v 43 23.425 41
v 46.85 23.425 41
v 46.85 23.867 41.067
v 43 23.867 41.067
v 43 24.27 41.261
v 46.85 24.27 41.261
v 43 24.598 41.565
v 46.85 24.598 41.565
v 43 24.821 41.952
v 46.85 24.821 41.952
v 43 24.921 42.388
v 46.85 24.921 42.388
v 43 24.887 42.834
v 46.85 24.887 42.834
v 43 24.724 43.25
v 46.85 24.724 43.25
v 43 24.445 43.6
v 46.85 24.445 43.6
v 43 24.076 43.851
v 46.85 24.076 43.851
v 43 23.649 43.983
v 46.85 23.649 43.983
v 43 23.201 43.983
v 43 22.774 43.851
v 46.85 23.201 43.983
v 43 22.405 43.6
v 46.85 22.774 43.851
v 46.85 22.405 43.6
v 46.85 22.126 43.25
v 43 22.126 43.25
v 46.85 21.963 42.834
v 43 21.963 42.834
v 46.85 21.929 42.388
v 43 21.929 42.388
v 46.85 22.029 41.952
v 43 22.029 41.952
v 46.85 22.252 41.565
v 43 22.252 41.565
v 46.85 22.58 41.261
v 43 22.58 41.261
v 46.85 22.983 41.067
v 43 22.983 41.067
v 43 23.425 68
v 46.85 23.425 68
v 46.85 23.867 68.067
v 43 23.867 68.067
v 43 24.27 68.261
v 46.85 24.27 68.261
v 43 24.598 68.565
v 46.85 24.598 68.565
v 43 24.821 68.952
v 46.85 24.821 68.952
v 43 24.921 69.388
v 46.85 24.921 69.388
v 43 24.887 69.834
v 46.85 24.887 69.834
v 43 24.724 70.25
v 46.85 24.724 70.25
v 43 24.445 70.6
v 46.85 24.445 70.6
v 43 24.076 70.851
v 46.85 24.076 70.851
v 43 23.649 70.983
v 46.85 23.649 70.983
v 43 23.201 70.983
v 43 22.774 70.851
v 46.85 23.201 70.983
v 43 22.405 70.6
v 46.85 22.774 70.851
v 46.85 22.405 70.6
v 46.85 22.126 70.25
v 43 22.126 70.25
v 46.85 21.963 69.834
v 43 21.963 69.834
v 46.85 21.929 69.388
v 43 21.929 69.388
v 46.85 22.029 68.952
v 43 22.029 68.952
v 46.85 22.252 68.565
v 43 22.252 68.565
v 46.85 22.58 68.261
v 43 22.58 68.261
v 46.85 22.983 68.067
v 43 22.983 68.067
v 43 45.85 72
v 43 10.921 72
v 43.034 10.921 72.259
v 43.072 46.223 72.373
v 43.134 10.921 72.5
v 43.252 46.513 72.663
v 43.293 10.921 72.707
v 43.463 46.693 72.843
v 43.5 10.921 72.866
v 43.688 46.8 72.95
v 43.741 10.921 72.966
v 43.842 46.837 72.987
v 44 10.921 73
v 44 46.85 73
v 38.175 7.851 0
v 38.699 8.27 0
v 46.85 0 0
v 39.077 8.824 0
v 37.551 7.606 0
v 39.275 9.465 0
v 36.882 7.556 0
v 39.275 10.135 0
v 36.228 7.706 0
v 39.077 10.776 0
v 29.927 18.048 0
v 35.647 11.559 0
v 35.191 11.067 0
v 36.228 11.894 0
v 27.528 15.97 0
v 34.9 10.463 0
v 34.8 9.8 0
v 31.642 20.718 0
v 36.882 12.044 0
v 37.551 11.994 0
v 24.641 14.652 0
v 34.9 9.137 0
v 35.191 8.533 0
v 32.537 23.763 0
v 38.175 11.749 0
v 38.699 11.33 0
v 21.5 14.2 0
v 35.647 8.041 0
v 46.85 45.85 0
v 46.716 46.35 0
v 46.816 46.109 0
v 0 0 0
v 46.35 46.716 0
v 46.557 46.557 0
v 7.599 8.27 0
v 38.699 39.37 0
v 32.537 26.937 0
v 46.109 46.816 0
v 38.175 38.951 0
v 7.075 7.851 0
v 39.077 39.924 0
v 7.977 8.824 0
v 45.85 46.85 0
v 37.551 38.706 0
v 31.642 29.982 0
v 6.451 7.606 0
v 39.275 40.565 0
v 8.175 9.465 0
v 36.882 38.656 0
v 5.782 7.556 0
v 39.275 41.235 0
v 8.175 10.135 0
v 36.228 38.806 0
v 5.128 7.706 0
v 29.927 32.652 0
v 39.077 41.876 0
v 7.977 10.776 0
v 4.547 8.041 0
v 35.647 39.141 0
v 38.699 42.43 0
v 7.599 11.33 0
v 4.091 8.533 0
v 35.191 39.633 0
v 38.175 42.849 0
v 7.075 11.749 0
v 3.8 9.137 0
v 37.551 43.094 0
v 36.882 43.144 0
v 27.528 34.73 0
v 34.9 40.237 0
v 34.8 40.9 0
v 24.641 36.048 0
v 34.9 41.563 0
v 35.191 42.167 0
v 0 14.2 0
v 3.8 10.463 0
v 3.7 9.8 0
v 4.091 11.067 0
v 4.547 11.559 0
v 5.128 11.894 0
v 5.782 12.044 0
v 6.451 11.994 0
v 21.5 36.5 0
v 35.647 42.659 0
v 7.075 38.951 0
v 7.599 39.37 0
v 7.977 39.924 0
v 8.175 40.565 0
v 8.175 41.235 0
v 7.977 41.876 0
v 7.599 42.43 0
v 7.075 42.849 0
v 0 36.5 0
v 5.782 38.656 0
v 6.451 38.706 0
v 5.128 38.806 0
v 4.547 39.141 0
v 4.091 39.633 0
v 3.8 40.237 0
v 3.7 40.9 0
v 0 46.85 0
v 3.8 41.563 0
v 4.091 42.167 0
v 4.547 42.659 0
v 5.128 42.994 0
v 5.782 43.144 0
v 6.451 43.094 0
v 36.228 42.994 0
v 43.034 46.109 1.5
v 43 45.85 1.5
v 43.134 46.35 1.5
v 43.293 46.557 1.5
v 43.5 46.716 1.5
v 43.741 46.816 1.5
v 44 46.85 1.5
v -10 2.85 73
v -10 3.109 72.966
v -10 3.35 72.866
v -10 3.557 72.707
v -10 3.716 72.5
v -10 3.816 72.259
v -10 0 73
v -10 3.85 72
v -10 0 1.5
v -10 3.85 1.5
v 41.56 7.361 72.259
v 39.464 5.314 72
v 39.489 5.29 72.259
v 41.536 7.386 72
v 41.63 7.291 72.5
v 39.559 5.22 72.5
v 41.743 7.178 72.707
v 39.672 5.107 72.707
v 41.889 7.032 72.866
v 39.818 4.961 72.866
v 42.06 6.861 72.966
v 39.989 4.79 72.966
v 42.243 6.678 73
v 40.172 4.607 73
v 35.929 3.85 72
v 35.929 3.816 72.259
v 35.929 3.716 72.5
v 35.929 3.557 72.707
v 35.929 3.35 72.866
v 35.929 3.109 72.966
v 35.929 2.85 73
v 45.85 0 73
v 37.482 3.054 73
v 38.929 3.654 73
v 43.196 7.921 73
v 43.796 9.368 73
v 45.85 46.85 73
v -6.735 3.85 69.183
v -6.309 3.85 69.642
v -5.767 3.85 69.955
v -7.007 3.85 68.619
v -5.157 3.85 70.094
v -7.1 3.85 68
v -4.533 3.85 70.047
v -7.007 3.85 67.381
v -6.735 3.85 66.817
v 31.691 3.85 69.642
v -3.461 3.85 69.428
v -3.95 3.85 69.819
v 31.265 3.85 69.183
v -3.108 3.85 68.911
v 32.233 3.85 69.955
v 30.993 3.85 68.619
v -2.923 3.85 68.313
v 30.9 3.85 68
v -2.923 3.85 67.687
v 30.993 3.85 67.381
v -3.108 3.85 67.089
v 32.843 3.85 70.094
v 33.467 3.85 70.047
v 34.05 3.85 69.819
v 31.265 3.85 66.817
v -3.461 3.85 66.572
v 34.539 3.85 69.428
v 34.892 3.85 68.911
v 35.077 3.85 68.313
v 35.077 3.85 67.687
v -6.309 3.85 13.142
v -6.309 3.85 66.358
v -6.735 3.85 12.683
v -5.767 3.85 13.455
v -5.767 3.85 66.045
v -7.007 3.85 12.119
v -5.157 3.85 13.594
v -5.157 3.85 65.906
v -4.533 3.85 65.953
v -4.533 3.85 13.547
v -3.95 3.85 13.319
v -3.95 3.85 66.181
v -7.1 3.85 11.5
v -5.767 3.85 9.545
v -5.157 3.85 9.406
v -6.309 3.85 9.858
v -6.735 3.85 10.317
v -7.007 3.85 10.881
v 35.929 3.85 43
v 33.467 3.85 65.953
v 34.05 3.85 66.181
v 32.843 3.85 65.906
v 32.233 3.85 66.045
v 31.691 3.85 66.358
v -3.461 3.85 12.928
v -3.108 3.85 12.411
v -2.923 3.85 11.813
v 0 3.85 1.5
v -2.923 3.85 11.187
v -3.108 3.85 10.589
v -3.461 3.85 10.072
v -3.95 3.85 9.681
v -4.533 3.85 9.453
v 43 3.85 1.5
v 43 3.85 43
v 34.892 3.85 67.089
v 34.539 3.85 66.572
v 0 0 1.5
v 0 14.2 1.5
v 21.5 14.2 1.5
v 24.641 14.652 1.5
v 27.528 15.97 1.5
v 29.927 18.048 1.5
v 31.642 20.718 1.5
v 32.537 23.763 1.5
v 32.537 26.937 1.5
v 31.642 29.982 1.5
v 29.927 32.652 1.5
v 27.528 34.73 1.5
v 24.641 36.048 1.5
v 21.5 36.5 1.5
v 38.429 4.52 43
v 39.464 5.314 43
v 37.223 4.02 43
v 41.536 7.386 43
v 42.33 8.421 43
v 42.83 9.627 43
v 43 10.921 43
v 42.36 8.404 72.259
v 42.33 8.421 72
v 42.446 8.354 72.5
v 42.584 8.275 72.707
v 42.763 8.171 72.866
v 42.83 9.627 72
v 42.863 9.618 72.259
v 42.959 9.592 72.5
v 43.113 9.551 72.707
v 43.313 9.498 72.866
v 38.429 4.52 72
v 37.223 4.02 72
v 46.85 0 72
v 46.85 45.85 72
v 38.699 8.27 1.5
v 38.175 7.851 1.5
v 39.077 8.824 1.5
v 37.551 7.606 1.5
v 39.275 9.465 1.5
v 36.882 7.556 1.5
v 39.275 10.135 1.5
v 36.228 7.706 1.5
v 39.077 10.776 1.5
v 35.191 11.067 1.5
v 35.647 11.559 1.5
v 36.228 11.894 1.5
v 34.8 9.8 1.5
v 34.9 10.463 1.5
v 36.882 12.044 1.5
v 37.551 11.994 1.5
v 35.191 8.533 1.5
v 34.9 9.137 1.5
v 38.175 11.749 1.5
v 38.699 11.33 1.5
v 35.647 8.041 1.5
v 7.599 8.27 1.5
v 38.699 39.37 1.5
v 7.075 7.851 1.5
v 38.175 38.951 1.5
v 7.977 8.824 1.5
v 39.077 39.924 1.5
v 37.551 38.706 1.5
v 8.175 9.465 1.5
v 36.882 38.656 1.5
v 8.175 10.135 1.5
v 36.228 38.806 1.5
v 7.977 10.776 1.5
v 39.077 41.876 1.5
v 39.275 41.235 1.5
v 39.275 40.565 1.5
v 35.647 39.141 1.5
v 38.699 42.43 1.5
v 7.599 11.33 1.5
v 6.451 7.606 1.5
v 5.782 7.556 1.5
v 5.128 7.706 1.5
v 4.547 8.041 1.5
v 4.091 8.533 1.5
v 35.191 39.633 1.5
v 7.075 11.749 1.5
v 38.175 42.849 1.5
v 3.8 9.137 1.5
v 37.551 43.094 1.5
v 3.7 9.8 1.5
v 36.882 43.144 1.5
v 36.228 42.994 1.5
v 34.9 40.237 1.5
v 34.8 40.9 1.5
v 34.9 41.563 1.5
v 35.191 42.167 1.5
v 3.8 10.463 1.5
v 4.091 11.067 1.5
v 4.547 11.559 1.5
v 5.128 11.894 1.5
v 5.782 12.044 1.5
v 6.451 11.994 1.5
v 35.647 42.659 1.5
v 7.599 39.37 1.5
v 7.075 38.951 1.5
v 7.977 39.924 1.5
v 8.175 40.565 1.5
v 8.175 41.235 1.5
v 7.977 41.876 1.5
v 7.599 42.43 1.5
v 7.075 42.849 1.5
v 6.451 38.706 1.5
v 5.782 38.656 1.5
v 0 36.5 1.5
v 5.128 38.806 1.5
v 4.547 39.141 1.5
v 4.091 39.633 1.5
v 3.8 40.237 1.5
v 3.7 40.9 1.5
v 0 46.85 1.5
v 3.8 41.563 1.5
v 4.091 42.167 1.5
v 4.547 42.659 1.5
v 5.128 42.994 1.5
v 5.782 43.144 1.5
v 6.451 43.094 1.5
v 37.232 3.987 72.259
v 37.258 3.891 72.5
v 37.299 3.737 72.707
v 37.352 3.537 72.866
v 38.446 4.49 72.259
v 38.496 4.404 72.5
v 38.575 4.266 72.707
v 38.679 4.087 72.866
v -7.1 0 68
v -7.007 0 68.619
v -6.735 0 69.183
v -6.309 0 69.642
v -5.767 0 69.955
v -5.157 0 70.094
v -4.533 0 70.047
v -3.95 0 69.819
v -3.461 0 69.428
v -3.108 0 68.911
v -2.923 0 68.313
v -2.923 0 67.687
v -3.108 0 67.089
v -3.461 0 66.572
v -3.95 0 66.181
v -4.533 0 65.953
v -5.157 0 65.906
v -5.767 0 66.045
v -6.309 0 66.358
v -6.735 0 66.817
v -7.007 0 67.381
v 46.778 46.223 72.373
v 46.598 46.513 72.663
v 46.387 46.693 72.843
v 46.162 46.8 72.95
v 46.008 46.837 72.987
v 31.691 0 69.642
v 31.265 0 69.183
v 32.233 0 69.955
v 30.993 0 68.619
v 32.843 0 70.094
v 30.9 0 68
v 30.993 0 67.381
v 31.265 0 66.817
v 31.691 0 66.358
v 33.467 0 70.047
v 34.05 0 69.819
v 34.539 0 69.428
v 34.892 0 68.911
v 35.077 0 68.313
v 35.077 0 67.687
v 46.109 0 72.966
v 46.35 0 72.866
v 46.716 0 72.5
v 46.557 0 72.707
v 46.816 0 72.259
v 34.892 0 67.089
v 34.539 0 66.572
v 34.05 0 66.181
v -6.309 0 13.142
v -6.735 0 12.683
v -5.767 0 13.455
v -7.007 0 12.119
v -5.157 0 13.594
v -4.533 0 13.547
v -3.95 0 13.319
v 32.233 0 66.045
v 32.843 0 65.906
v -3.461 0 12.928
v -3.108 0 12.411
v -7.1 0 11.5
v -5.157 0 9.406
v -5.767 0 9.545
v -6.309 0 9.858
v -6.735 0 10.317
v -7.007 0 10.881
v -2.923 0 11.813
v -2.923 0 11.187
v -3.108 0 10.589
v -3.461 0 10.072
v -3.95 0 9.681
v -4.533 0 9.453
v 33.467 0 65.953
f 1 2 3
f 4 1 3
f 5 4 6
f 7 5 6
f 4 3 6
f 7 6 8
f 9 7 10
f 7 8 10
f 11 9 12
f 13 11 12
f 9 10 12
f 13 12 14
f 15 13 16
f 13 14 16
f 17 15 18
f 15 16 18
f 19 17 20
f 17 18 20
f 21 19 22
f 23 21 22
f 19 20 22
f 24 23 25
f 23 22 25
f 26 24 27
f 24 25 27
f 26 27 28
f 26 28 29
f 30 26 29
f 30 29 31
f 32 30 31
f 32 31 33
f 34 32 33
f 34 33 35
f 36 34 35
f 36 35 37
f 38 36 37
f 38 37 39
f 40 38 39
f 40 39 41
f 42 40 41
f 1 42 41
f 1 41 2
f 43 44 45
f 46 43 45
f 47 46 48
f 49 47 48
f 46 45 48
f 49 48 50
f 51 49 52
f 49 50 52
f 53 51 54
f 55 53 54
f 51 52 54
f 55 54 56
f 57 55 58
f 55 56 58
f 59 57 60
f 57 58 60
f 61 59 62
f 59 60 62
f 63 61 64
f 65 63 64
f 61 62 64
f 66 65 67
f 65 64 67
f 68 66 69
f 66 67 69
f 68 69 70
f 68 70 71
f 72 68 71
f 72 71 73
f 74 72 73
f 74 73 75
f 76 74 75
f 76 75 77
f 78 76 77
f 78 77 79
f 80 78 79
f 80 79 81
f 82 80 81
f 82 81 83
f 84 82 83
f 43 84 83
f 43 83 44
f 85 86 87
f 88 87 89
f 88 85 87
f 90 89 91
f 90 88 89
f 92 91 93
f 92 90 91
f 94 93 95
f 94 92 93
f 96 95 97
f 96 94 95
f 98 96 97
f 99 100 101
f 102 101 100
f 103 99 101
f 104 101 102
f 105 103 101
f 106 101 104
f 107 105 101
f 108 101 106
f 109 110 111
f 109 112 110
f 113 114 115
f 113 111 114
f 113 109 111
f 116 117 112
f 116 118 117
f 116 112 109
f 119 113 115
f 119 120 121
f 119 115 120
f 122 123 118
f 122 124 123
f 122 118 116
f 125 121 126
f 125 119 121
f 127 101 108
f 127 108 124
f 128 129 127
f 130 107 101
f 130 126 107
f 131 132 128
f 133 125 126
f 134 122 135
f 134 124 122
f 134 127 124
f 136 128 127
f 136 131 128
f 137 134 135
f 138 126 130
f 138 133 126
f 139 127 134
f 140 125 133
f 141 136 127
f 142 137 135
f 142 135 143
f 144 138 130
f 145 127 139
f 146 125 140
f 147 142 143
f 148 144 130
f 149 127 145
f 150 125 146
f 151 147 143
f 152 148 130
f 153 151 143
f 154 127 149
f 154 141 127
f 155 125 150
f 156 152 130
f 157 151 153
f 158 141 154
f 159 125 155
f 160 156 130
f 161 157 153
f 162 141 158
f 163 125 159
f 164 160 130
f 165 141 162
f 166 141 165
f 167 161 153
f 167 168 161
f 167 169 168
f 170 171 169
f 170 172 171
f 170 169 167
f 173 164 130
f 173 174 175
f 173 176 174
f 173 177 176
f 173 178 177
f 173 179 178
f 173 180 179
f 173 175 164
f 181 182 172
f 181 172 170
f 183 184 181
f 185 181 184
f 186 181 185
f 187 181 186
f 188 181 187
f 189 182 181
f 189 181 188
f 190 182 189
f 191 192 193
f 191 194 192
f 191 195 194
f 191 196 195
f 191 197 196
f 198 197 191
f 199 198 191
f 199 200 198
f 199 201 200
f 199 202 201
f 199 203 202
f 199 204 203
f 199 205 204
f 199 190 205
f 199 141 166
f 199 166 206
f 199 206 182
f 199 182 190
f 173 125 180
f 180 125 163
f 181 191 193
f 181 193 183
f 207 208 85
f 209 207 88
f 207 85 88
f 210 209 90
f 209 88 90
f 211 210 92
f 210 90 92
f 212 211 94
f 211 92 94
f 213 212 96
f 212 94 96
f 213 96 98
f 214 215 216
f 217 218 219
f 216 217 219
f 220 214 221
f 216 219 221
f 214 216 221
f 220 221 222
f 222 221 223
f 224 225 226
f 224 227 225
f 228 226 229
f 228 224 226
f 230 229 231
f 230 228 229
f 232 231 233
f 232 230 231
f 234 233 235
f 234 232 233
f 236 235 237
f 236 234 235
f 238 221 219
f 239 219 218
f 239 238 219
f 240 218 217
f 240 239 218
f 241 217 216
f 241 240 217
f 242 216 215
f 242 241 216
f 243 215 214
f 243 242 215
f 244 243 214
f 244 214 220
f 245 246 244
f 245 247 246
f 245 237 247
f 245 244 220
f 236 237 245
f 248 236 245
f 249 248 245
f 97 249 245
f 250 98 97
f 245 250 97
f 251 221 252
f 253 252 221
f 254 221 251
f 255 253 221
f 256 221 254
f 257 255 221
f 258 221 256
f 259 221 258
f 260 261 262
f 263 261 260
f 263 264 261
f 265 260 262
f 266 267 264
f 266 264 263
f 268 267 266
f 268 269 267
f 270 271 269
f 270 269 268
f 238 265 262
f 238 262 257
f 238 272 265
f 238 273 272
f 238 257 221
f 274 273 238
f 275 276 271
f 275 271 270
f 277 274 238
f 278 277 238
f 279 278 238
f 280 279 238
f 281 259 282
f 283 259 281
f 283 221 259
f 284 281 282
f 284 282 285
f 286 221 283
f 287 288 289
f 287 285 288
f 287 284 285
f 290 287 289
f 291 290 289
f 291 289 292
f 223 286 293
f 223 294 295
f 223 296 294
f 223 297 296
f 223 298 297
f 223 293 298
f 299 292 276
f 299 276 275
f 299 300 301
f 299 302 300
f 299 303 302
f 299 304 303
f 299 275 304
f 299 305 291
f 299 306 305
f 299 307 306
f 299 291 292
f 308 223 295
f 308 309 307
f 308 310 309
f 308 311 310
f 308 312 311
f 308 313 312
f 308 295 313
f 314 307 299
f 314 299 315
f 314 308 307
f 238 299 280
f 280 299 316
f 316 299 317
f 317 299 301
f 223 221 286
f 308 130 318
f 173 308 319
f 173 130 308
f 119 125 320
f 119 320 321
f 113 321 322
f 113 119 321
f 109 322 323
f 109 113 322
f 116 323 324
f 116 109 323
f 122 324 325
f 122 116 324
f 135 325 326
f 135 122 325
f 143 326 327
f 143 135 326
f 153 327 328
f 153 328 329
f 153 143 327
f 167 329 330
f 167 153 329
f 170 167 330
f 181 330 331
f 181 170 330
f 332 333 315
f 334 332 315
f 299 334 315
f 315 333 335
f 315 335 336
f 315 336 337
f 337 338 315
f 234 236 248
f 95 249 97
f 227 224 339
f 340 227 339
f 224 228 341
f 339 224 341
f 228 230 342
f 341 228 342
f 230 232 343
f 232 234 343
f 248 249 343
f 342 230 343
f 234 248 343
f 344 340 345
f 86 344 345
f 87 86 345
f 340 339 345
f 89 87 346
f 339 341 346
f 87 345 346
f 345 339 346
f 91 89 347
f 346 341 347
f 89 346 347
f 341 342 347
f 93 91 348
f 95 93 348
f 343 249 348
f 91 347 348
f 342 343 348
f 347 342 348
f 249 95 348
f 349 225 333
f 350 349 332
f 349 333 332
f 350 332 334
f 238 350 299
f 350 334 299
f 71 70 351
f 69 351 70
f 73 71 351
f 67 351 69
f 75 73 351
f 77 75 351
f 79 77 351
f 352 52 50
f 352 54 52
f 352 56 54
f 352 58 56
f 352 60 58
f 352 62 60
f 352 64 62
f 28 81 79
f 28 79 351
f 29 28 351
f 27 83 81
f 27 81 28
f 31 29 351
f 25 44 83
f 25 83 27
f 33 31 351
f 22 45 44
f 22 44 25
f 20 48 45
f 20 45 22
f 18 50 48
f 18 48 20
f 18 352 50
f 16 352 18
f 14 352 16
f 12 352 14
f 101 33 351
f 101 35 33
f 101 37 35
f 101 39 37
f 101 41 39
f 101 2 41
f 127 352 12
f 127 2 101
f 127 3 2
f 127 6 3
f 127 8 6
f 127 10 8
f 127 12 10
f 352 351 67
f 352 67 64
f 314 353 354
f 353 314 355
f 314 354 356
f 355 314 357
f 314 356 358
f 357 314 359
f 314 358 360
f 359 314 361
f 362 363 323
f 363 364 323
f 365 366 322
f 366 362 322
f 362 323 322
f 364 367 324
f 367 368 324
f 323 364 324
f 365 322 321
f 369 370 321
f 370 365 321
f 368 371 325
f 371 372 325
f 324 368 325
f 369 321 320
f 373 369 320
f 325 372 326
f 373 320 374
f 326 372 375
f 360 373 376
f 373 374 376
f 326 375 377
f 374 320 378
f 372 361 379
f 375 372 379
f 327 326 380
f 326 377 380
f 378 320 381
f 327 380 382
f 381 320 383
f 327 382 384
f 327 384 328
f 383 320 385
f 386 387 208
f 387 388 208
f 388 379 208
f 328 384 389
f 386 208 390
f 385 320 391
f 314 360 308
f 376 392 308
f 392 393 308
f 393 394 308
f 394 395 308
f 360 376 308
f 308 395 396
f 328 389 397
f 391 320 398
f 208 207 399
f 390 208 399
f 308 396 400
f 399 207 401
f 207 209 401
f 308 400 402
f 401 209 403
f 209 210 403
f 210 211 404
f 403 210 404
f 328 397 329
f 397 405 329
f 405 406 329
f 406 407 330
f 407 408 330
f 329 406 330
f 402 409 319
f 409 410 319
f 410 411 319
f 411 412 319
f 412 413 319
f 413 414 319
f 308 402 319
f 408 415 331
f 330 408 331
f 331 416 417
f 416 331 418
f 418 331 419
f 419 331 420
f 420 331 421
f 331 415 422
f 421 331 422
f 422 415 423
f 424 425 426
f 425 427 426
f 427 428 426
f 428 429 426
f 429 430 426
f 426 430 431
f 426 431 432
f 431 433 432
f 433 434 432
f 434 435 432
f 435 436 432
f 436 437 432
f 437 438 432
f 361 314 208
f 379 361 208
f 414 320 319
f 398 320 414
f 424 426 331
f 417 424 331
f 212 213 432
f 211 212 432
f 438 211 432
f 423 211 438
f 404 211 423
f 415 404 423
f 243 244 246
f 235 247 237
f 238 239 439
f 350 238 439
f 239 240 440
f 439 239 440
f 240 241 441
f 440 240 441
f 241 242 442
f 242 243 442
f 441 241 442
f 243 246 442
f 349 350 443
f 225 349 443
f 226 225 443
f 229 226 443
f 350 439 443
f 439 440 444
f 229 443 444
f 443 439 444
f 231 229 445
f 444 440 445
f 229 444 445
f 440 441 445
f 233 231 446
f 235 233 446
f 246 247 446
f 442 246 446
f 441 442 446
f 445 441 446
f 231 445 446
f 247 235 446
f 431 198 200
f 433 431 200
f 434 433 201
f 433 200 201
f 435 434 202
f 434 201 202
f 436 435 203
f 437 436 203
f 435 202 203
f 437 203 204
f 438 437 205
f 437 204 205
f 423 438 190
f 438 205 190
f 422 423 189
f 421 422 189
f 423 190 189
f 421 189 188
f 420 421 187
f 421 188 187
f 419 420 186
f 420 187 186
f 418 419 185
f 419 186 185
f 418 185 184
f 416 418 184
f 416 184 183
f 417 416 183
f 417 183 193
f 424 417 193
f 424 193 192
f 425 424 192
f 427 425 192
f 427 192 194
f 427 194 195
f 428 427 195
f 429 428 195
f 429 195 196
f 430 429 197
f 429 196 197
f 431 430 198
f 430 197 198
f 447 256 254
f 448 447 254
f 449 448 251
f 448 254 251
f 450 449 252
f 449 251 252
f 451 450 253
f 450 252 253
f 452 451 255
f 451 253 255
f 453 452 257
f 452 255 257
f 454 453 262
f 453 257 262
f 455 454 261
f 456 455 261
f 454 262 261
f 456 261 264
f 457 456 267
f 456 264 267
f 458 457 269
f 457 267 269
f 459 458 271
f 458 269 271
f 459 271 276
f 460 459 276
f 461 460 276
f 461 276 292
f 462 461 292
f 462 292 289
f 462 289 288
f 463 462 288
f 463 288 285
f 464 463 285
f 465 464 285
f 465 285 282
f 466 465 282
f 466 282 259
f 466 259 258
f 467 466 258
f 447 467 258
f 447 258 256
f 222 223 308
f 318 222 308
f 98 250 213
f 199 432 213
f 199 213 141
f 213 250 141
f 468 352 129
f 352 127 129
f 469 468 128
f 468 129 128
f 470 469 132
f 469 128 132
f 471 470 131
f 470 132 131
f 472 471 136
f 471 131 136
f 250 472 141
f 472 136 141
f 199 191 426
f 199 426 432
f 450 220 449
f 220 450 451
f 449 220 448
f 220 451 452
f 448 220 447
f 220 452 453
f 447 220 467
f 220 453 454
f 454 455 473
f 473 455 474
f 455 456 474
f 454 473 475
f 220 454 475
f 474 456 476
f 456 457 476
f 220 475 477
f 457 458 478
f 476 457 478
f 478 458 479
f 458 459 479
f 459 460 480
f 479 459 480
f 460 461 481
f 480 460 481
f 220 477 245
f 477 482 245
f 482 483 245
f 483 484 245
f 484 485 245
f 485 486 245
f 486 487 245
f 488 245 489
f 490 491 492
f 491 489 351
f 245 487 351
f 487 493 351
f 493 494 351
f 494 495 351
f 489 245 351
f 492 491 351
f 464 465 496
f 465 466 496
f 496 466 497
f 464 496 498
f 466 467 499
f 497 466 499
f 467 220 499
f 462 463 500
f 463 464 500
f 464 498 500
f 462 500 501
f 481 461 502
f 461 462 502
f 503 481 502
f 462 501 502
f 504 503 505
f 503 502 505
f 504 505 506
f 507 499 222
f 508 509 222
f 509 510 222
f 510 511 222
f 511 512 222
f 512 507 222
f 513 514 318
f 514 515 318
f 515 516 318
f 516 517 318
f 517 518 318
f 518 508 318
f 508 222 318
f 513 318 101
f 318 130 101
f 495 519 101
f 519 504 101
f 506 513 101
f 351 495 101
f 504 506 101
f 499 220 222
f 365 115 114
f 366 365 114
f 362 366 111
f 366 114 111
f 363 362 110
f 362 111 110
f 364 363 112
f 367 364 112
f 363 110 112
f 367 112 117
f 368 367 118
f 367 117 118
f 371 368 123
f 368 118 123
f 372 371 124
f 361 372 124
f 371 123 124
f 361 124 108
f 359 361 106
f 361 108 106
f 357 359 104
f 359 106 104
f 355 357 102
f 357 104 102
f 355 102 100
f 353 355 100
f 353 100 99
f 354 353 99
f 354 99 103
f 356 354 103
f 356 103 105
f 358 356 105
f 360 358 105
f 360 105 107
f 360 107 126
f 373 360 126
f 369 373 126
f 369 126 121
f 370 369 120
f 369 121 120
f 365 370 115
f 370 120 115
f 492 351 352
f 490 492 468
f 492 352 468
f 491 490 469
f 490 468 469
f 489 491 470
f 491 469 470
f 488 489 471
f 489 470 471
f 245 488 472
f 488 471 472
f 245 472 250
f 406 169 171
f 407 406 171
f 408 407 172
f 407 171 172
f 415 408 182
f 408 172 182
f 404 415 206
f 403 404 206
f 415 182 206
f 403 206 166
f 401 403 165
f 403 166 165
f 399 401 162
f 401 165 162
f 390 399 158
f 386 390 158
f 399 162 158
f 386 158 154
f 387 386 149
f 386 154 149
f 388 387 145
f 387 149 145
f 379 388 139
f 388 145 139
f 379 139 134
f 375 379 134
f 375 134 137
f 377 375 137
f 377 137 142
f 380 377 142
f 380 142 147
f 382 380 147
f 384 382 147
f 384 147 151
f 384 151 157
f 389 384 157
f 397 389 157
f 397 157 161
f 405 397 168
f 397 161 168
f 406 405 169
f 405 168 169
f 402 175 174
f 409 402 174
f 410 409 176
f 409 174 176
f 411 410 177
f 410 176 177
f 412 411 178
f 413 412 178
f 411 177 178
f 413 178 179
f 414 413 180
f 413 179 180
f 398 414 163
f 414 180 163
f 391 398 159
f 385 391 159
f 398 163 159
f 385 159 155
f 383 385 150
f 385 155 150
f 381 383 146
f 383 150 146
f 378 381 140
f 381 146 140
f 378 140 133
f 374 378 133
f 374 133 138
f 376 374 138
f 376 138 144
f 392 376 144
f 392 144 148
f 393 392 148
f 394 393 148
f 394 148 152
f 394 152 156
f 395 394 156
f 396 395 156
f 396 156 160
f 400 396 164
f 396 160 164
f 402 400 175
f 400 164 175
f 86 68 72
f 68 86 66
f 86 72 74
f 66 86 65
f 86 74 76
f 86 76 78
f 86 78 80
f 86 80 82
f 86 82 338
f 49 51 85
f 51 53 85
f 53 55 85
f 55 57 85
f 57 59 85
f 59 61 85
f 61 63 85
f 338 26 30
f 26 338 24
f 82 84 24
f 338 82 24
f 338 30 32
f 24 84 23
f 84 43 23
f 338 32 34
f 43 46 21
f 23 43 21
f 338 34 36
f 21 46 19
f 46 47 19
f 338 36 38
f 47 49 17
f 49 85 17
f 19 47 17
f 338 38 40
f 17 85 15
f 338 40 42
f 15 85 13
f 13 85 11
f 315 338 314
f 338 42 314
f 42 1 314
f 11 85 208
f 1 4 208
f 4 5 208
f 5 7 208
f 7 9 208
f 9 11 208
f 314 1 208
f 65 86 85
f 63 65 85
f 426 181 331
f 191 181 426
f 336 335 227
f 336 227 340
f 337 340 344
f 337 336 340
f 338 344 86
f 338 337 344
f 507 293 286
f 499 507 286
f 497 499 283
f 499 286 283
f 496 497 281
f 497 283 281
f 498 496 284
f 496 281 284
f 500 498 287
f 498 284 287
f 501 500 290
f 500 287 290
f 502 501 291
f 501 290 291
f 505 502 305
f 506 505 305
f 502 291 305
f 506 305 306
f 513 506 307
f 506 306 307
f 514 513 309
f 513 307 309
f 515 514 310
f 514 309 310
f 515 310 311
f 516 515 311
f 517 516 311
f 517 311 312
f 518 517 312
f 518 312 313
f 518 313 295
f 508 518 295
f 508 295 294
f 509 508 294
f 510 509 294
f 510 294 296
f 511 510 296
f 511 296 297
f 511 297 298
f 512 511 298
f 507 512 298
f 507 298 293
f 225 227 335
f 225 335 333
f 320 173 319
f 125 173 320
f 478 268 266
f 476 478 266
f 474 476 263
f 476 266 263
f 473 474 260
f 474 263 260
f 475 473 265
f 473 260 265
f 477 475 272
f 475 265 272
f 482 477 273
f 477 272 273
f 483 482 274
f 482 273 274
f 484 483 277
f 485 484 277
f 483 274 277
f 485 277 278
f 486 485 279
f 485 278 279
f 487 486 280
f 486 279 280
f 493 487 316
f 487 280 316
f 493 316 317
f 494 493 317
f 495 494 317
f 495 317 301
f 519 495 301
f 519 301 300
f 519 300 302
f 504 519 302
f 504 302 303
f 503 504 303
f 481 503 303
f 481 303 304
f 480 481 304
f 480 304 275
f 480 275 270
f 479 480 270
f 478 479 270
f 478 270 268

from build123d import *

# Parameters (mm, degrees)
BOSS_EXTRU_1_DEPTH      = 39
ESQUISSE2_R             = 2.25
BOSS_EXTRU_2_DEPTH      = 1.5
ESQUISSE3_W             = 34
ESQUISSE3_H             = 46.85
BOSS_EXTRU_3_DEPTH      = 3.85
ESQUISSE4_R             = 1.5
ENL_V_MAT_EXTRU_1_DEPTH = 6.5
ESQUISSE5_W             = 53
ESQUISSE5_H             = 71.5
BOSS_EXTRU_4_DEPTH      = 3.85
ESQUISSE6_R             = 2.1
ENL_V_MAT_EXTRU_2_DEPTH = 6.5
BOSS_EXTRU_5_DEPTH      = 30
CONG_1_R                = 5
CONG_2_R                = 1


with BuildPart() as part:
    # Esquisse1 → Boss.-Extru.1 (new body)
    with BuildSketch(Plane.XY):
        Polygon((0, 0), (46.85, 0), (46.85, 46.85), (43, 46.85), (43, 3.85), (0, 3.85), align=None)
    extrude(amount=BOSS_EXTRU_1_DEPTH)

    # Esquisse2 → Boss.-Extru.2 (add)
    with BuildSketch(Plane(origin=(0, 0, 0), x_dir=(-1, 0, 0), z_dir=(0, 0, -1))):
        with BuildLine():
            Line((0, 46.85), (-43, 46.85))
            Line((-43, 46.85), (-43, 3.85))
            Line((-43, 3.85), (0, 3.85))
            Line((0, 3.85), (0, 14.2))
            Line((0, 14.2), (-21.5, 14.2))
            ThreePointArc((-21.5, 14.2), (-32.65, 25.35), (-21.5, 36.5))
            Line((-21.5, 36.5), (0, 36.5))
            Line((0, 36.5), (0, 46.85))
        make_face()
        with Locations((-37.05, 9.8)):
            Circle(ESQUISSE2_R, mode=Mode.SUBTRACT)
        with Locations((-5.95, 9.8)):
            Circle(ESQUISSE2_R, mode=Mode.SUBTRACT)
        with Locations((-37.05, 40.9)):
            Circle(ESQUISSE2_R, mode=Mode.SUBTRACT)
        with Locations((-5.95, 40.9)):
            Circle(ESQUISSE2_R, mode=Mode.SUBTRACT)
    extrude(amount=-BOSS_EXTRU_2_DEPTH)

    # Esquisse3 → Boss.-Extru.3 (add)
    with BuildSketch(Plane(origin=(46.85, 0, 0), x_dir=(0, 0, -1), z_dir=(1, 0, 0))):
        with Locations((-56, 23.425)):
            Rectangle(ESQUISSE3_W, ESQUISSE3_H)
    extrude(amount=-BOSS_EXTRU_3_DEPTH)

    # Esquisse4 → Enlèv. mat.-Extru.1 (cut)
    with BuildSketch(Plane(origin=(46.85, 0, 0), x_dir=(0, 0, -1), z_dir=(1, 0, 0))):
        with Locations((-69.5, 23.425)):
            Circle(ESQUISSE4_R)
        with Locations((-42.5, 23.425)):
            Circle(ESQUISSE4_R)
    extrude(amount=-ENL_V_MAT_EXTRU_1_DEPTH, mode=Mode.SUBTRACT)

    # Esquisse5 → Boss.-Extru.4 (add)
    with BuildSketch(Plane(origin=(0, 3.85, 0), x_dir=(1, 0, 0), z_dir=(0, 1, 0))):
        with Locations((16.5, -37.25)):
            Rectangle(ESQUISSE5_W, ESQUISSE5_H)
    extrude(amount=-BOSS_EXTRU_4_DEPTH)

    # Esquisse6 → Enlèv. mat.-Extru.2 (cut)
    with BuildSketch(Plane(origin=(0, 3.85, 0), x_dir=(1, 0, 0), z_dir=(0, 1, 0))):
        with Locations(Location((-5, -68, 0), (0, 0, 180))):
            Circle(ESQUISSE6_R)
        with Locations(Location((33, -68, 0), (0, 0, 180))):
            Circle(ESQUISSE6_R)
        with Locations(Location((-5, -11.5, 0), (0, 0, 180))):
            Circle(ESQUISSE6_R)
    extrude(amount=-ENL_V_MAT_EXTRU_2_DEPTH, mode=Mode.SUBTRACT)

    # Esquisse7 → Boss.-Extru.5 (add)
    with BuildSketch(Plane.XY.offset(73)):
        Polygon((43, 3.85), (43, 8.85), (38, 3.85), align=None)
    extrude(amount=-BOSS_EXTRU_5_DEPTH)

    # Congé1
    cong_1_edges = [part.edges().sort_by_distance(p)[0] for p in [
        (38, 3.85, 58),
        (43, 8.85, 58),
    ]]
    fillet(cong_1_edges, radius=CONG_1_R)

    # Congé2
    cong_2_edges = [part.edges().sort_by_distance(p)[0] for p in [
        (12.964466094, 3.85, 73),
        (43, 46.85, 37.25),
        (46.85, 46.85, 36.5),
        (40.5, 6.35, 73),
        (43, 28.885533906, 73),
        (37.84234935, 4.230602337, 73),
        (42.619397663, 9.00765065, 73),
        (46.85, 23.425, 73),
    ]]
    fillet(cong_2_edges, radius=CONG_2_R)


solid = part.part
